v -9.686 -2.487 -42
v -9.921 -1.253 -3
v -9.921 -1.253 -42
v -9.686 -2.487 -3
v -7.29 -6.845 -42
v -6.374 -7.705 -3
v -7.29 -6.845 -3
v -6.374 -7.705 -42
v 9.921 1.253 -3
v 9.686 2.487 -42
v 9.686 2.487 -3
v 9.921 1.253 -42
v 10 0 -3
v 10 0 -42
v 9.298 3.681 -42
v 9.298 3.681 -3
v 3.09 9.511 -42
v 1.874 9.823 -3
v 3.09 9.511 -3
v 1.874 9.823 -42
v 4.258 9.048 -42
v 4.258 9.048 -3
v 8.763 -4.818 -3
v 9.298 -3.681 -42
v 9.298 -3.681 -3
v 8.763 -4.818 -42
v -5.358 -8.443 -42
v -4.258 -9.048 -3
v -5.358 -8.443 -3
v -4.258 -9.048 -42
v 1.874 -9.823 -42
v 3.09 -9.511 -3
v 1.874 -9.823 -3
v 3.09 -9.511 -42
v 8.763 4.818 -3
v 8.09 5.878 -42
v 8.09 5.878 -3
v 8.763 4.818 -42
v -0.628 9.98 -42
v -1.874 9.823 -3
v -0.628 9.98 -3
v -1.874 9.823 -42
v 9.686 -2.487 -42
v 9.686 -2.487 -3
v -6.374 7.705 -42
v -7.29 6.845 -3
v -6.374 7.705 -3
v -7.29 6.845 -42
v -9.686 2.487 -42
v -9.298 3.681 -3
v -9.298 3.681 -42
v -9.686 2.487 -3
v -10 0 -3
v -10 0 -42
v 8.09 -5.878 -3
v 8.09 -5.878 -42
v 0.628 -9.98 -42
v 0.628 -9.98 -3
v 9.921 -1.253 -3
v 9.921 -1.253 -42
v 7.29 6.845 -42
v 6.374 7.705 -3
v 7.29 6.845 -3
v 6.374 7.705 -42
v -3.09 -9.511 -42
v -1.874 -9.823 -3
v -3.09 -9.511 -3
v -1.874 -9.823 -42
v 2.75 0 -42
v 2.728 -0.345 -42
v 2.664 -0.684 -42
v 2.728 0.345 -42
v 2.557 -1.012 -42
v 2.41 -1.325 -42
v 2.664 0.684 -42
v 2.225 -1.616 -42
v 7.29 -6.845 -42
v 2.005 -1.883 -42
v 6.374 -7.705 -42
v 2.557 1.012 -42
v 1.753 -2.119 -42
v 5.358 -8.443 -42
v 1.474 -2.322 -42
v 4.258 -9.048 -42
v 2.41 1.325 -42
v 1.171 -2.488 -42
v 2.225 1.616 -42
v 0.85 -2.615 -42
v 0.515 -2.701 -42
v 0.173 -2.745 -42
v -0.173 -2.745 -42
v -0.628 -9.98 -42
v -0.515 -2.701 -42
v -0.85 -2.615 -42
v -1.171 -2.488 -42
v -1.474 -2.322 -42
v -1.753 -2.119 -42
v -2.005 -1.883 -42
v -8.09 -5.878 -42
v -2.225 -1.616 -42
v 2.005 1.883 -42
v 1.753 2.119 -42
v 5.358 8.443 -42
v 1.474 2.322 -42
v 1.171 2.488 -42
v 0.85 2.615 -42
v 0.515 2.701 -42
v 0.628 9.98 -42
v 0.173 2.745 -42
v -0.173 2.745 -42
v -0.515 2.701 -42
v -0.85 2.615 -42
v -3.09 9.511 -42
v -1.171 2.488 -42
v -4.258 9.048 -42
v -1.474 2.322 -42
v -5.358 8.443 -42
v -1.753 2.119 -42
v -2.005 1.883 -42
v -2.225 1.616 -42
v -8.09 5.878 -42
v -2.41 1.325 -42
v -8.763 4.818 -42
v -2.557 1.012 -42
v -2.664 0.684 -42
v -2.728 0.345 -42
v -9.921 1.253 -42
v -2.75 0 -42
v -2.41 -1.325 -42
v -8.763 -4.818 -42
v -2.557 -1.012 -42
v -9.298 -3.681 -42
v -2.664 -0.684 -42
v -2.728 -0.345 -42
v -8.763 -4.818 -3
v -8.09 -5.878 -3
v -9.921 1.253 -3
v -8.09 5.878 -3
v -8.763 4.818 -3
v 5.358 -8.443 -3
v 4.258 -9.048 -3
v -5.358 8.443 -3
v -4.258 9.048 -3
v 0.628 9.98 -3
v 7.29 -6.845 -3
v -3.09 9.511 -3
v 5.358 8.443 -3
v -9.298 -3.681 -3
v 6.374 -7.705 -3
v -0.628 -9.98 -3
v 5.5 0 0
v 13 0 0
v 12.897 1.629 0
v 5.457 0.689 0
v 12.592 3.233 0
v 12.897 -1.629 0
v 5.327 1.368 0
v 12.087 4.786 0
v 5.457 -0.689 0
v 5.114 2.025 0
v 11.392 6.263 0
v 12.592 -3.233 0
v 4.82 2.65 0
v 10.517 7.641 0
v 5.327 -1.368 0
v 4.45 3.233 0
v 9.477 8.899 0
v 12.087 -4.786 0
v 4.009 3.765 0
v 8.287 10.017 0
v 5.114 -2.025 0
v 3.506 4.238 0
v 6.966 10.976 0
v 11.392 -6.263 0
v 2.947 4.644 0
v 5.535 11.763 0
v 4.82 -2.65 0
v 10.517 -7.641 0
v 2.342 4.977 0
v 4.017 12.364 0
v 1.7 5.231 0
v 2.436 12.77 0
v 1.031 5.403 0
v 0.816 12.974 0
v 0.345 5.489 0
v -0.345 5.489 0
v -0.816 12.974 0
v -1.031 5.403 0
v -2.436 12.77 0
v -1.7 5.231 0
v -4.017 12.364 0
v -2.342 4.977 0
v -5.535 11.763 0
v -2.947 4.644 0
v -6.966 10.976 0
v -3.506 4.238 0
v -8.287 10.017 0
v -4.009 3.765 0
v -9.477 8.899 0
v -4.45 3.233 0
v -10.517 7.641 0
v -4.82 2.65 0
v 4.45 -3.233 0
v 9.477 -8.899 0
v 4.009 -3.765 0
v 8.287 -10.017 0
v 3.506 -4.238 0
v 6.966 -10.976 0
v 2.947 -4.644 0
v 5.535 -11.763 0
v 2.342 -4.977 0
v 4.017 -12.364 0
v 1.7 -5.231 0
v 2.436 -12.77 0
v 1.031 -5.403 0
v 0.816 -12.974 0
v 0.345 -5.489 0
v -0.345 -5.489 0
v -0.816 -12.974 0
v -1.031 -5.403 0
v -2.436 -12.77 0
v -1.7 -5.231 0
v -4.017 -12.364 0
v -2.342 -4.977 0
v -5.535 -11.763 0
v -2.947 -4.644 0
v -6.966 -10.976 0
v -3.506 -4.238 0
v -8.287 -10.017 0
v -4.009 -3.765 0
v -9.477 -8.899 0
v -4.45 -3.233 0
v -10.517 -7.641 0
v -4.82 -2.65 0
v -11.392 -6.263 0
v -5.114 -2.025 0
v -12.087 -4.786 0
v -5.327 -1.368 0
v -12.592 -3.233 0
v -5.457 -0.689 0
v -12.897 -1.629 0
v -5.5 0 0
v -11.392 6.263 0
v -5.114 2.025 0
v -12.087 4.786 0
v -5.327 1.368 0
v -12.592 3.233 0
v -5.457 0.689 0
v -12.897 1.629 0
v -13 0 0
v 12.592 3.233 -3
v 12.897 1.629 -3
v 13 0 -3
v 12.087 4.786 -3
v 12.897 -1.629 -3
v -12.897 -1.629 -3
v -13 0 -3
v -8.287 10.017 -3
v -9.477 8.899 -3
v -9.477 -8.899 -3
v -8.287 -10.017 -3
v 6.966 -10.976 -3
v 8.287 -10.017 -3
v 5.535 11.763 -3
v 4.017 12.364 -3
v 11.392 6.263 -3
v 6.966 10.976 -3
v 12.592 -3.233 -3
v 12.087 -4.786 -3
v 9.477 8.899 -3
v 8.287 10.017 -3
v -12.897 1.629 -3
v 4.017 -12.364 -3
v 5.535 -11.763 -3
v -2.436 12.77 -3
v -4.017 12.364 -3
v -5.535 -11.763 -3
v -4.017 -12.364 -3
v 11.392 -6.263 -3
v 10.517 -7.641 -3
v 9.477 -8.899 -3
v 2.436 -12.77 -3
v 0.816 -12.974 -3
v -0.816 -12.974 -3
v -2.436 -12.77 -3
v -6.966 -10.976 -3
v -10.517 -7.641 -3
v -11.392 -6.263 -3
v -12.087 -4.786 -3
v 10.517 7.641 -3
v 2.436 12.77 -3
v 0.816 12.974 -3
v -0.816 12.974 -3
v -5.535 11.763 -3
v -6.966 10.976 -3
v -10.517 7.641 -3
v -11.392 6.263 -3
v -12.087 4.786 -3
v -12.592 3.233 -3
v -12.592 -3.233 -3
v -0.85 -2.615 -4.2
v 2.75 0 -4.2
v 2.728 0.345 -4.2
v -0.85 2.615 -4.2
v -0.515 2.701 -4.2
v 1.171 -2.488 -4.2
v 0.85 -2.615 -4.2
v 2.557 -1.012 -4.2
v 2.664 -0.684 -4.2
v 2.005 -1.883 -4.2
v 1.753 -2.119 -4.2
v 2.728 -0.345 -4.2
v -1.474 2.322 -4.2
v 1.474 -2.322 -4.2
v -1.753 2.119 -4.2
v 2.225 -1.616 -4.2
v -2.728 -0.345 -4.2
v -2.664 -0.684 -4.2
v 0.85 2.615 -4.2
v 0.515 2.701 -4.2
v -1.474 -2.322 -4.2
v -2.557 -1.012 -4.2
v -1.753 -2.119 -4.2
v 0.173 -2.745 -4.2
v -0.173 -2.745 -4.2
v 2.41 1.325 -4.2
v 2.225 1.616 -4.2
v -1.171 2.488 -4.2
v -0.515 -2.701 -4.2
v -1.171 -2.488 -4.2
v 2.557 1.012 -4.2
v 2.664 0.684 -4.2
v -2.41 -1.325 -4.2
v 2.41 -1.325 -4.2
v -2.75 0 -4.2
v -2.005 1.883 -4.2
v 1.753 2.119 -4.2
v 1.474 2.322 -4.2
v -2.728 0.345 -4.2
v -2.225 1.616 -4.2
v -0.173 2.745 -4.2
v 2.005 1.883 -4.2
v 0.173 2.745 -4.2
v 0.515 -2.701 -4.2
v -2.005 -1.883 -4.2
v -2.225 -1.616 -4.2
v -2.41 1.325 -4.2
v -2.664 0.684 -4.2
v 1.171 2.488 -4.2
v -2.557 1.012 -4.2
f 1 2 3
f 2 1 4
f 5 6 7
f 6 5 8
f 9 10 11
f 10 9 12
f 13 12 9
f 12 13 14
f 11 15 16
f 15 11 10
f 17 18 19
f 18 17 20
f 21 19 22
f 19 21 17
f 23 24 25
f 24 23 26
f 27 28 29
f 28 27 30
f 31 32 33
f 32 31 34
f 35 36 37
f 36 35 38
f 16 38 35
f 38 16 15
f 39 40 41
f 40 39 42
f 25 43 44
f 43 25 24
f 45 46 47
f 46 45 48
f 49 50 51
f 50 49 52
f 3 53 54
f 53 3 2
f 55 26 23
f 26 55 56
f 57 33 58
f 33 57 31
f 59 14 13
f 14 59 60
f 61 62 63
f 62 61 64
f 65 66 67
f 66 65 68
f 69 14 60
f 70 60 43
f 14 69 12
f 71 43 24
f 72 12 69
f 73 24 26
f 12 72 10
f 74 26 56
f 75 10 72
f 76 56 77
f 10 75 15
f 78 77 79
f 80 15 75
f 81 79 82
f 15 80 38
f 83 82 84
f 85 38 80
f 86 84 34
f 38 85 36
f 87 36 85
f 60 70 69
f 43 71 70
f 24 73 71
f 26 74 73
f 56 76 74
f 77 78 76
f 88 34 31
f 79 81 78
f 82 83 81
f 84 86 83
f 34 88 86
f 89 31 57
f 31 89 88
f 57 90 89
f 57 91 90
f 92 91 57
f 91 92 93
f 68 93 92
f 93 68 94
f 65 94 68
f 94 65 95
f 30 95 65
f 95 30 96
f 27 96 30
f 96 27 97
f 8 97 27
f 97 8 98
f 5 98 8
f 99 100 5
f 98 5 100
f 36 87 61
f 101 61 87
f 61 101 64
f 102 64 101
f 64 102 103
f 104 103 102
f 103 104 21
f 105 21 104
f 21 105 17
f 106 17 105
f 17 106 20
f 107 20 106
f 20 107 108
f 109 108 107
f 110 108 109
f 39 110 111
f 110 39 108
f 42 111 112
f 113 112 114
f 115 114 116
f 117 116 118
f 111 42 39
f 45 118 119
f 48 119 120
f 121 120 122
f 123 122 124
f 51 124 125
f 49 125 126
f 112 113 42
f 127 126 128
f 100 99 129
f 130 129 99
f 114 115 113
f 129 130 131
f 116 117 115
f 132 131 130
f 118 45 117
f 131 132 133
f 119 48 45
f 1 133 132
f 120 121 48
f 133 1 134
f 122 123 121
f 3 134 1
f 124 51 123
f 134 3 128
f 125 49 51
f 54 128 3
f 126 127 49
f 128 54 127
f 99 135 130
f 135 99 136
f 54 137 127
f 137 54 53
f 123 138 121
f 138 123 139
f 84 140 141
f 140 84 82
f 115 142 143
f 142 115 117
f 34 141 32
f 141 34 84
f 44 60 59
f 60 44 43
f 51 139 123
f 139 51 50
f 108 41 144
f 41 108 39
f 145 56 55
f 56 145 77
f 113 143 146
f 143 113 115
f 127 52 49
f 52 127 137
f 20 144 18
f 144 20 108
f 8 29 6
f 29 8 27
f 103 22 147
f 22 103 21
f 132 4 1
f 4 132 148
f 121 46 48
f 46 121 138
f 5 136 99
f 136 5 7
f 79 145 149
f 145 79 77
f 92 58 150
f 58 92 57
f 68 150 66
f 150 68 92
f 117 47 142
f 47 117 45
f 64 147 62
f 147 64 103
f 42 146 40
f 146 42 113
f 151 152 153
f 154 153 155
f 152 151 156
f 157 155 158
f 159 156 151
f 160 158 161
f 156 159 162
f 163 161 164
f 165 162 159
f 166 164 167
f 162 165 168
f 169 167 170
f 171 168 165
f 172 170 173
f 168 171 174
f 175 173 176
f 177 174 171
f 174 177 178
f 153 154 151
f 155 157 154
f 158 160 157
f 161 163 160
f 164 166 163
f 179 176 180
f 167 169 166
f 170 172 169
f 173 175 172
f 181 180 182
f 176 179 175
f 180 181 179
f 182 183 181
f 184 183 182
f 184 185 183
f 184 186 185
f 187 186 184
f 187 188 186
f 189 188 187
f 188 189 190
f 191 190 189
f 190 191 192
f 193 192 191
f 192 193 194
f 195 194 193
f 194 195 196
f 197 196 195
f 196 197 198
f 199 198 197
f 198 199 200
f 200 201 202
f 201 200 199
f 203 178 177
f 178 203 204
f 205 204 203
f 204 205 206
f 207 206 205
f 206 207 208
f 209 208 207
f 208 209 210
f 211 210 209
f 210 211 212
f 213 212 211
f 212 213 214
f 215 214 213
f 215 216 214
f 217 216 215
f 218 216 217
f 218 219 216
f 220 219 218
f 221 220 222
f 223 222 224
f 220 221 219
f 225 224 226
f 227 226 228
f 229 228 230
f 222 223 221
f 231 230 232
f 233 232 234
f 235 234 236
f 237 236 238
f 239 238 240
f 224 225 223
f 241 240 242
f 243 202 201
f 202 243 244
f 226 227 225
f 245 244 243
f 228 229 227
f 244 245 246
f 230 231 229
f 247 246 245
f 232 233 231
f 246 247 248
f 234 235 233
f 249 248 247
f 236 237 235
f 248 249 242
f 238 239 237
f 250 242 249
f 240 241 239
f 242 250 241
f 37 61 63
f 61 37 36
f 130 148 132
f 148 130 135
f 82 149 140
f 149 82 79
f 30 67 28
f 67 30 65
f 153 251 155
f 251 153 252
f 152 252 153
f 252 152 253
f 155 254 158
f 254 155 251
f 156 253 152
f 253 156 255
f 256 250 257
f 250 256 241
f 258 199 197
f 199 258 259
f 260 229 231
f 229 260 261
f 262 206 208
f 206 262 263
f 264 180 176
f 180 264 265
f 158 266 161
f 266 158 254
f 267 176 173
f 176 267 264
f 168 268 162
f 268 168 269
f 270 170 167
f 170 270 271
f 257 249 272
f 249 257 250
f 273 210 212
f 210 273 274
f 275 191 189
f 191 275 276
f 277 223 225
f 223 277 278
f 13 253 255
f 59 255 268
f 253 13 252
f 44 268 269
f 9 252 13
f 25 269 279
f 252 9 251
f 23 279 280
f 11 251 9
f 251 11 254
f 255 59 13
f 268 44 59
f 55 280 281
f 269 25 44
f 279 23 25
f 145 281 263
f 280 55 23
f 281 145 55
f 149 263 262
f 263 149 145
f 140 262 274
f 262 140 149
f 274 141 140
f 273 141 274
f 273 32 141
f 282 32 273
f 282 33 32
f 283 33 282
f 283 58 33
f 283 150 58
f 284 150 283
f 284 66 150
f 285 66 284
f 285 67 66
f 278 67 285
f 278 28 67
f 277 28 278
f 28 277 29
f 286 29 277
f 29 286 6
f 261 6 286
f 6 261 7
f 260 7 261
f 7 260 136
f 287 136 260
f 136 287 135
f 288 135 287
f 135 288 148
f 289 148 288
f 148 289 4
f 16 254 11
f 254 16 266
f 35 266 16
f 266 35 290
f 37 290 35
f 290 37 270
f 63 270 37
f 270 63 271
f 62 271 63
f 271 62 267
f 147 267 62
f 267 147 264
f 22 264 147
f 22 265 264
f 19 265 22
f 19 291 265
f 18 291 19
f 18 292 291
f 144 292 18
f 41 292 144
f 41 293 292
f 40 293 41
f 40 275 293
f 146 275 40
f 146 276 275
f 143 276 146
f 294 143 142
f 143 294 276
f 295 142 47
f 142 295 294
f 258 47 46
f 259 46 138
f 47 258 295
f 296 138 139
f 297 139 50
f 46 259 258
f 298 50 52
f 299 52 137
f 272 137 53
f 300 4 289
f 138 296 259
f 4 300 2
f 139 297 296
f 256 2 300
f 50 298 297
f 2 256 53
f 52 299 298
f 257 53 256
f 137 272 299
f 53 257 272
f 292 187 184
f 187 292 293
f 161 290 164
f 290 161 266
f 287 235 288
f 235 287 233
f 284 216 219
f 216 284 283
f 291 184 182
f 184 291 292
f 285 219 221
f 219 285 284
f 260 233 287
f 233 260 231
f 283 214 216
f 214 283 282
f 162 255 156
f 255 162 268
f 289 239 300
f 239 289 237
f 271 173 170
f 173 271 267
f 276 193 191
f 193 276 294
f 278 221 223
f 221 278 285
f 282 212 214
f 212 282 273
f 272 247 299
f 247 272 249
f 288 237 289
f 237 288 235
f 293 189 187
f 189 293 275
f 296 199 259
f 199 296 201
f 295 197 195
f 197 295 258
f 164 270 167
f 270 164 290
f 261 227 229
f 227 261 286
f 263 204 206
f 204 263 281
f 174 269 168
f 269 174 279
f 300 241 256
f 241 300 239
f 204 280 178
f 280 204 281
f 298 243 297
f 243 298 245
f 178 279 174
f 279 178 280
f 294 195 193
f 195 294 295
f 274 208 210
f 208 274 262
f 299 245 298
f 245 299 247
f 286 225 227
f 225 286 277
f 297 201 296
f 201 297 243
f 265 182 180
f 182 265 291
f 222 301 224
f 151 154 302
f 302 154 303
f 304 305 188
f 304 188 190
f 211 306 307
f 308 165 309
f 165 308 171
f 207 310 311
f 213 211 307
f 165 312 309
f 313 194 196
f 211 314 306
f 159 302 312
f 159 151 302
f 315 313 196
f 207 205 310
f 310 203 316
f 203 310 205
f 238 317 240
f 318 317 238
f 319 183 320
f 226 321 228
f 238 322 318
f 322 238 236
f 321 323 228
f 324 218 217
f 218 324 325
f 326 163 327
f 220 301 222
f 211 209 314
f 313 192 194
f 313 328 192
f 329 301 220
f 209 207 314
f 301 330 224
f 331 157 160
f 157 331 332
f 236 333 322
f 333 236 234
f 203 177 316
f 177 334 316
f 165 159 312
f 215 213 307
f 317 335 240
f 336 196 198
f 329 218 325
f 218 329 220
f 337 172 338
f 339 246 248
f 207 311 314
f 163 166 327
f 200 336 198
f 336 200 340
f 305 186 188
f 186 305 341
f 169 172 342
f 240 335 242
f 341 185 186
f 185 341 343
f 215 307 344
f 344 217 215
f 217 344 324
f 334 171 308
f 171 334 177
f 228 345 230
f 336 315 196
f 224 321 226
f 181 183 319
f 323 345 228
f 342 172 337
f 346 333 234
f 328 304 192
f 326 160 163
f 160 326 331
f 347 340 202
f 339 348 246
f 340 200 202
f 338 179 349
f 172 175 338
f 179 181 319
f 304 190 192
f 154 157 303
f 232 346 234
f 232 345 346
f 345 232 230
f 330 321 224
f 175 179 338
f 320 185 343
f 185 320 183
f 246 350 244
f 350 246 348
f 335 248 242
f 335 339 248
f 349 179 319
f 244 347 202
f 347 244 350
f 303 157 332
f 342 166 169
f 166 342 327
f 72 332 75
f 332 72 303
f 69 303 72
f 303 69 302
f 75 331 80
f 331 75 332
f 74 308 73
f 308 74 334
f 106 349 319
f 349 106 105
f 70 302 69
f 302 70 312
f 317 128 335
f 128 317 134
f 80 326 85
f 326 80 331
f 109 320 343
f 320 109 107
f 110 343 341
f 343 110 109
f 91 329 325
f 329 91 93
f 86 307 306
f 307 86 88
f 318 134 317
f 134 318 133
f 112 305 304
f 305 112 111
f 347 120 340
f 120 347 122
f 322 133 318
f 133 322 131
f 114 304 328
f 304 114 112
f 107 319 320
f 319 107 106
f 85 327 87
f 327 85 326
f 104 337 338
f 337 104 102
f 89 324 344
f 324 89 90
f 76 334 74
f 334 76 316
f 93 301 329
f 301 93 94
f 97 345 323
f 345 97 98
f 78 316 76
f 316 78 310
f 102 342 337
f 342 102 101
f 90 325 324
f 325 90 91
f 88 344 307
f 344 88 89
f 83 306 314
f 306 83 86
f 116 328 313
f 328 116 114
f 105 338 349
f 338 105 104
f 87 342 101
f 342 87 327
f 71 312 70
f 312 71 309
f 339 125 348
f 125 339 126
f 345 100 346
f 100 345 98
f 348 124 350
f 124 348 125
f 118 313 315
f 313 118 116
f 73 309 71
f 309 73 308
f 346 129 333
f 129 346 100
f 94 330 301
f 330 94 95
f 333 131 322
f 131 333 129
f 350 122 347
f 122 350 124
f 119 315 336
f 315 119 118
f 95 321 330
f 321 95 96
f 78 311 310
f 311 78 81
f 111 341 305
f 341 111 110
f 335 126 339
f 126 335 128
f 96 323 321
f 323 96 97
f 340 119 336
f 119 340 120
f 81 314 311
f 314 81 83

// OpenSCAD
$fn = 50;


difference() {
	union() {
		translate(v = [0, 0, -42.0000000000]) {
			cylinder(h = 42, r = 10.0000000000);
		}
		translate(v = [0, 0, -3.0000000000]) {
			cylinder(h = 3, r = 13.0000000000);
		}
	}
	union() {
		translate(v = [0, 0, 0]) {
			rotate(a = [0, 0, 0]) {
				difference() {
					union() {
						#translate(v = [0, 0, -42.0000000000]) {
							cylinder(h = 42, r = 2.2500000000);
						}
						#translate(v = [0, 0, -4.2000000000]) {
							cylinder(h = 4.2000000000, r = 10.0000000000, r1 = 2.7500000000, r2 = 5.5000000000);
						}
						#translate(v = [0, 0, -42.0000000000]) {
							cylinder(h = 42, r = 2.7500000000);
						}
						#translate(v = [0, 0, -42.0000000000]) {
							cylinder(h = 42, r = 2.2500000000);
						}
					}
					union();
				}
			}
		}
	}
}
